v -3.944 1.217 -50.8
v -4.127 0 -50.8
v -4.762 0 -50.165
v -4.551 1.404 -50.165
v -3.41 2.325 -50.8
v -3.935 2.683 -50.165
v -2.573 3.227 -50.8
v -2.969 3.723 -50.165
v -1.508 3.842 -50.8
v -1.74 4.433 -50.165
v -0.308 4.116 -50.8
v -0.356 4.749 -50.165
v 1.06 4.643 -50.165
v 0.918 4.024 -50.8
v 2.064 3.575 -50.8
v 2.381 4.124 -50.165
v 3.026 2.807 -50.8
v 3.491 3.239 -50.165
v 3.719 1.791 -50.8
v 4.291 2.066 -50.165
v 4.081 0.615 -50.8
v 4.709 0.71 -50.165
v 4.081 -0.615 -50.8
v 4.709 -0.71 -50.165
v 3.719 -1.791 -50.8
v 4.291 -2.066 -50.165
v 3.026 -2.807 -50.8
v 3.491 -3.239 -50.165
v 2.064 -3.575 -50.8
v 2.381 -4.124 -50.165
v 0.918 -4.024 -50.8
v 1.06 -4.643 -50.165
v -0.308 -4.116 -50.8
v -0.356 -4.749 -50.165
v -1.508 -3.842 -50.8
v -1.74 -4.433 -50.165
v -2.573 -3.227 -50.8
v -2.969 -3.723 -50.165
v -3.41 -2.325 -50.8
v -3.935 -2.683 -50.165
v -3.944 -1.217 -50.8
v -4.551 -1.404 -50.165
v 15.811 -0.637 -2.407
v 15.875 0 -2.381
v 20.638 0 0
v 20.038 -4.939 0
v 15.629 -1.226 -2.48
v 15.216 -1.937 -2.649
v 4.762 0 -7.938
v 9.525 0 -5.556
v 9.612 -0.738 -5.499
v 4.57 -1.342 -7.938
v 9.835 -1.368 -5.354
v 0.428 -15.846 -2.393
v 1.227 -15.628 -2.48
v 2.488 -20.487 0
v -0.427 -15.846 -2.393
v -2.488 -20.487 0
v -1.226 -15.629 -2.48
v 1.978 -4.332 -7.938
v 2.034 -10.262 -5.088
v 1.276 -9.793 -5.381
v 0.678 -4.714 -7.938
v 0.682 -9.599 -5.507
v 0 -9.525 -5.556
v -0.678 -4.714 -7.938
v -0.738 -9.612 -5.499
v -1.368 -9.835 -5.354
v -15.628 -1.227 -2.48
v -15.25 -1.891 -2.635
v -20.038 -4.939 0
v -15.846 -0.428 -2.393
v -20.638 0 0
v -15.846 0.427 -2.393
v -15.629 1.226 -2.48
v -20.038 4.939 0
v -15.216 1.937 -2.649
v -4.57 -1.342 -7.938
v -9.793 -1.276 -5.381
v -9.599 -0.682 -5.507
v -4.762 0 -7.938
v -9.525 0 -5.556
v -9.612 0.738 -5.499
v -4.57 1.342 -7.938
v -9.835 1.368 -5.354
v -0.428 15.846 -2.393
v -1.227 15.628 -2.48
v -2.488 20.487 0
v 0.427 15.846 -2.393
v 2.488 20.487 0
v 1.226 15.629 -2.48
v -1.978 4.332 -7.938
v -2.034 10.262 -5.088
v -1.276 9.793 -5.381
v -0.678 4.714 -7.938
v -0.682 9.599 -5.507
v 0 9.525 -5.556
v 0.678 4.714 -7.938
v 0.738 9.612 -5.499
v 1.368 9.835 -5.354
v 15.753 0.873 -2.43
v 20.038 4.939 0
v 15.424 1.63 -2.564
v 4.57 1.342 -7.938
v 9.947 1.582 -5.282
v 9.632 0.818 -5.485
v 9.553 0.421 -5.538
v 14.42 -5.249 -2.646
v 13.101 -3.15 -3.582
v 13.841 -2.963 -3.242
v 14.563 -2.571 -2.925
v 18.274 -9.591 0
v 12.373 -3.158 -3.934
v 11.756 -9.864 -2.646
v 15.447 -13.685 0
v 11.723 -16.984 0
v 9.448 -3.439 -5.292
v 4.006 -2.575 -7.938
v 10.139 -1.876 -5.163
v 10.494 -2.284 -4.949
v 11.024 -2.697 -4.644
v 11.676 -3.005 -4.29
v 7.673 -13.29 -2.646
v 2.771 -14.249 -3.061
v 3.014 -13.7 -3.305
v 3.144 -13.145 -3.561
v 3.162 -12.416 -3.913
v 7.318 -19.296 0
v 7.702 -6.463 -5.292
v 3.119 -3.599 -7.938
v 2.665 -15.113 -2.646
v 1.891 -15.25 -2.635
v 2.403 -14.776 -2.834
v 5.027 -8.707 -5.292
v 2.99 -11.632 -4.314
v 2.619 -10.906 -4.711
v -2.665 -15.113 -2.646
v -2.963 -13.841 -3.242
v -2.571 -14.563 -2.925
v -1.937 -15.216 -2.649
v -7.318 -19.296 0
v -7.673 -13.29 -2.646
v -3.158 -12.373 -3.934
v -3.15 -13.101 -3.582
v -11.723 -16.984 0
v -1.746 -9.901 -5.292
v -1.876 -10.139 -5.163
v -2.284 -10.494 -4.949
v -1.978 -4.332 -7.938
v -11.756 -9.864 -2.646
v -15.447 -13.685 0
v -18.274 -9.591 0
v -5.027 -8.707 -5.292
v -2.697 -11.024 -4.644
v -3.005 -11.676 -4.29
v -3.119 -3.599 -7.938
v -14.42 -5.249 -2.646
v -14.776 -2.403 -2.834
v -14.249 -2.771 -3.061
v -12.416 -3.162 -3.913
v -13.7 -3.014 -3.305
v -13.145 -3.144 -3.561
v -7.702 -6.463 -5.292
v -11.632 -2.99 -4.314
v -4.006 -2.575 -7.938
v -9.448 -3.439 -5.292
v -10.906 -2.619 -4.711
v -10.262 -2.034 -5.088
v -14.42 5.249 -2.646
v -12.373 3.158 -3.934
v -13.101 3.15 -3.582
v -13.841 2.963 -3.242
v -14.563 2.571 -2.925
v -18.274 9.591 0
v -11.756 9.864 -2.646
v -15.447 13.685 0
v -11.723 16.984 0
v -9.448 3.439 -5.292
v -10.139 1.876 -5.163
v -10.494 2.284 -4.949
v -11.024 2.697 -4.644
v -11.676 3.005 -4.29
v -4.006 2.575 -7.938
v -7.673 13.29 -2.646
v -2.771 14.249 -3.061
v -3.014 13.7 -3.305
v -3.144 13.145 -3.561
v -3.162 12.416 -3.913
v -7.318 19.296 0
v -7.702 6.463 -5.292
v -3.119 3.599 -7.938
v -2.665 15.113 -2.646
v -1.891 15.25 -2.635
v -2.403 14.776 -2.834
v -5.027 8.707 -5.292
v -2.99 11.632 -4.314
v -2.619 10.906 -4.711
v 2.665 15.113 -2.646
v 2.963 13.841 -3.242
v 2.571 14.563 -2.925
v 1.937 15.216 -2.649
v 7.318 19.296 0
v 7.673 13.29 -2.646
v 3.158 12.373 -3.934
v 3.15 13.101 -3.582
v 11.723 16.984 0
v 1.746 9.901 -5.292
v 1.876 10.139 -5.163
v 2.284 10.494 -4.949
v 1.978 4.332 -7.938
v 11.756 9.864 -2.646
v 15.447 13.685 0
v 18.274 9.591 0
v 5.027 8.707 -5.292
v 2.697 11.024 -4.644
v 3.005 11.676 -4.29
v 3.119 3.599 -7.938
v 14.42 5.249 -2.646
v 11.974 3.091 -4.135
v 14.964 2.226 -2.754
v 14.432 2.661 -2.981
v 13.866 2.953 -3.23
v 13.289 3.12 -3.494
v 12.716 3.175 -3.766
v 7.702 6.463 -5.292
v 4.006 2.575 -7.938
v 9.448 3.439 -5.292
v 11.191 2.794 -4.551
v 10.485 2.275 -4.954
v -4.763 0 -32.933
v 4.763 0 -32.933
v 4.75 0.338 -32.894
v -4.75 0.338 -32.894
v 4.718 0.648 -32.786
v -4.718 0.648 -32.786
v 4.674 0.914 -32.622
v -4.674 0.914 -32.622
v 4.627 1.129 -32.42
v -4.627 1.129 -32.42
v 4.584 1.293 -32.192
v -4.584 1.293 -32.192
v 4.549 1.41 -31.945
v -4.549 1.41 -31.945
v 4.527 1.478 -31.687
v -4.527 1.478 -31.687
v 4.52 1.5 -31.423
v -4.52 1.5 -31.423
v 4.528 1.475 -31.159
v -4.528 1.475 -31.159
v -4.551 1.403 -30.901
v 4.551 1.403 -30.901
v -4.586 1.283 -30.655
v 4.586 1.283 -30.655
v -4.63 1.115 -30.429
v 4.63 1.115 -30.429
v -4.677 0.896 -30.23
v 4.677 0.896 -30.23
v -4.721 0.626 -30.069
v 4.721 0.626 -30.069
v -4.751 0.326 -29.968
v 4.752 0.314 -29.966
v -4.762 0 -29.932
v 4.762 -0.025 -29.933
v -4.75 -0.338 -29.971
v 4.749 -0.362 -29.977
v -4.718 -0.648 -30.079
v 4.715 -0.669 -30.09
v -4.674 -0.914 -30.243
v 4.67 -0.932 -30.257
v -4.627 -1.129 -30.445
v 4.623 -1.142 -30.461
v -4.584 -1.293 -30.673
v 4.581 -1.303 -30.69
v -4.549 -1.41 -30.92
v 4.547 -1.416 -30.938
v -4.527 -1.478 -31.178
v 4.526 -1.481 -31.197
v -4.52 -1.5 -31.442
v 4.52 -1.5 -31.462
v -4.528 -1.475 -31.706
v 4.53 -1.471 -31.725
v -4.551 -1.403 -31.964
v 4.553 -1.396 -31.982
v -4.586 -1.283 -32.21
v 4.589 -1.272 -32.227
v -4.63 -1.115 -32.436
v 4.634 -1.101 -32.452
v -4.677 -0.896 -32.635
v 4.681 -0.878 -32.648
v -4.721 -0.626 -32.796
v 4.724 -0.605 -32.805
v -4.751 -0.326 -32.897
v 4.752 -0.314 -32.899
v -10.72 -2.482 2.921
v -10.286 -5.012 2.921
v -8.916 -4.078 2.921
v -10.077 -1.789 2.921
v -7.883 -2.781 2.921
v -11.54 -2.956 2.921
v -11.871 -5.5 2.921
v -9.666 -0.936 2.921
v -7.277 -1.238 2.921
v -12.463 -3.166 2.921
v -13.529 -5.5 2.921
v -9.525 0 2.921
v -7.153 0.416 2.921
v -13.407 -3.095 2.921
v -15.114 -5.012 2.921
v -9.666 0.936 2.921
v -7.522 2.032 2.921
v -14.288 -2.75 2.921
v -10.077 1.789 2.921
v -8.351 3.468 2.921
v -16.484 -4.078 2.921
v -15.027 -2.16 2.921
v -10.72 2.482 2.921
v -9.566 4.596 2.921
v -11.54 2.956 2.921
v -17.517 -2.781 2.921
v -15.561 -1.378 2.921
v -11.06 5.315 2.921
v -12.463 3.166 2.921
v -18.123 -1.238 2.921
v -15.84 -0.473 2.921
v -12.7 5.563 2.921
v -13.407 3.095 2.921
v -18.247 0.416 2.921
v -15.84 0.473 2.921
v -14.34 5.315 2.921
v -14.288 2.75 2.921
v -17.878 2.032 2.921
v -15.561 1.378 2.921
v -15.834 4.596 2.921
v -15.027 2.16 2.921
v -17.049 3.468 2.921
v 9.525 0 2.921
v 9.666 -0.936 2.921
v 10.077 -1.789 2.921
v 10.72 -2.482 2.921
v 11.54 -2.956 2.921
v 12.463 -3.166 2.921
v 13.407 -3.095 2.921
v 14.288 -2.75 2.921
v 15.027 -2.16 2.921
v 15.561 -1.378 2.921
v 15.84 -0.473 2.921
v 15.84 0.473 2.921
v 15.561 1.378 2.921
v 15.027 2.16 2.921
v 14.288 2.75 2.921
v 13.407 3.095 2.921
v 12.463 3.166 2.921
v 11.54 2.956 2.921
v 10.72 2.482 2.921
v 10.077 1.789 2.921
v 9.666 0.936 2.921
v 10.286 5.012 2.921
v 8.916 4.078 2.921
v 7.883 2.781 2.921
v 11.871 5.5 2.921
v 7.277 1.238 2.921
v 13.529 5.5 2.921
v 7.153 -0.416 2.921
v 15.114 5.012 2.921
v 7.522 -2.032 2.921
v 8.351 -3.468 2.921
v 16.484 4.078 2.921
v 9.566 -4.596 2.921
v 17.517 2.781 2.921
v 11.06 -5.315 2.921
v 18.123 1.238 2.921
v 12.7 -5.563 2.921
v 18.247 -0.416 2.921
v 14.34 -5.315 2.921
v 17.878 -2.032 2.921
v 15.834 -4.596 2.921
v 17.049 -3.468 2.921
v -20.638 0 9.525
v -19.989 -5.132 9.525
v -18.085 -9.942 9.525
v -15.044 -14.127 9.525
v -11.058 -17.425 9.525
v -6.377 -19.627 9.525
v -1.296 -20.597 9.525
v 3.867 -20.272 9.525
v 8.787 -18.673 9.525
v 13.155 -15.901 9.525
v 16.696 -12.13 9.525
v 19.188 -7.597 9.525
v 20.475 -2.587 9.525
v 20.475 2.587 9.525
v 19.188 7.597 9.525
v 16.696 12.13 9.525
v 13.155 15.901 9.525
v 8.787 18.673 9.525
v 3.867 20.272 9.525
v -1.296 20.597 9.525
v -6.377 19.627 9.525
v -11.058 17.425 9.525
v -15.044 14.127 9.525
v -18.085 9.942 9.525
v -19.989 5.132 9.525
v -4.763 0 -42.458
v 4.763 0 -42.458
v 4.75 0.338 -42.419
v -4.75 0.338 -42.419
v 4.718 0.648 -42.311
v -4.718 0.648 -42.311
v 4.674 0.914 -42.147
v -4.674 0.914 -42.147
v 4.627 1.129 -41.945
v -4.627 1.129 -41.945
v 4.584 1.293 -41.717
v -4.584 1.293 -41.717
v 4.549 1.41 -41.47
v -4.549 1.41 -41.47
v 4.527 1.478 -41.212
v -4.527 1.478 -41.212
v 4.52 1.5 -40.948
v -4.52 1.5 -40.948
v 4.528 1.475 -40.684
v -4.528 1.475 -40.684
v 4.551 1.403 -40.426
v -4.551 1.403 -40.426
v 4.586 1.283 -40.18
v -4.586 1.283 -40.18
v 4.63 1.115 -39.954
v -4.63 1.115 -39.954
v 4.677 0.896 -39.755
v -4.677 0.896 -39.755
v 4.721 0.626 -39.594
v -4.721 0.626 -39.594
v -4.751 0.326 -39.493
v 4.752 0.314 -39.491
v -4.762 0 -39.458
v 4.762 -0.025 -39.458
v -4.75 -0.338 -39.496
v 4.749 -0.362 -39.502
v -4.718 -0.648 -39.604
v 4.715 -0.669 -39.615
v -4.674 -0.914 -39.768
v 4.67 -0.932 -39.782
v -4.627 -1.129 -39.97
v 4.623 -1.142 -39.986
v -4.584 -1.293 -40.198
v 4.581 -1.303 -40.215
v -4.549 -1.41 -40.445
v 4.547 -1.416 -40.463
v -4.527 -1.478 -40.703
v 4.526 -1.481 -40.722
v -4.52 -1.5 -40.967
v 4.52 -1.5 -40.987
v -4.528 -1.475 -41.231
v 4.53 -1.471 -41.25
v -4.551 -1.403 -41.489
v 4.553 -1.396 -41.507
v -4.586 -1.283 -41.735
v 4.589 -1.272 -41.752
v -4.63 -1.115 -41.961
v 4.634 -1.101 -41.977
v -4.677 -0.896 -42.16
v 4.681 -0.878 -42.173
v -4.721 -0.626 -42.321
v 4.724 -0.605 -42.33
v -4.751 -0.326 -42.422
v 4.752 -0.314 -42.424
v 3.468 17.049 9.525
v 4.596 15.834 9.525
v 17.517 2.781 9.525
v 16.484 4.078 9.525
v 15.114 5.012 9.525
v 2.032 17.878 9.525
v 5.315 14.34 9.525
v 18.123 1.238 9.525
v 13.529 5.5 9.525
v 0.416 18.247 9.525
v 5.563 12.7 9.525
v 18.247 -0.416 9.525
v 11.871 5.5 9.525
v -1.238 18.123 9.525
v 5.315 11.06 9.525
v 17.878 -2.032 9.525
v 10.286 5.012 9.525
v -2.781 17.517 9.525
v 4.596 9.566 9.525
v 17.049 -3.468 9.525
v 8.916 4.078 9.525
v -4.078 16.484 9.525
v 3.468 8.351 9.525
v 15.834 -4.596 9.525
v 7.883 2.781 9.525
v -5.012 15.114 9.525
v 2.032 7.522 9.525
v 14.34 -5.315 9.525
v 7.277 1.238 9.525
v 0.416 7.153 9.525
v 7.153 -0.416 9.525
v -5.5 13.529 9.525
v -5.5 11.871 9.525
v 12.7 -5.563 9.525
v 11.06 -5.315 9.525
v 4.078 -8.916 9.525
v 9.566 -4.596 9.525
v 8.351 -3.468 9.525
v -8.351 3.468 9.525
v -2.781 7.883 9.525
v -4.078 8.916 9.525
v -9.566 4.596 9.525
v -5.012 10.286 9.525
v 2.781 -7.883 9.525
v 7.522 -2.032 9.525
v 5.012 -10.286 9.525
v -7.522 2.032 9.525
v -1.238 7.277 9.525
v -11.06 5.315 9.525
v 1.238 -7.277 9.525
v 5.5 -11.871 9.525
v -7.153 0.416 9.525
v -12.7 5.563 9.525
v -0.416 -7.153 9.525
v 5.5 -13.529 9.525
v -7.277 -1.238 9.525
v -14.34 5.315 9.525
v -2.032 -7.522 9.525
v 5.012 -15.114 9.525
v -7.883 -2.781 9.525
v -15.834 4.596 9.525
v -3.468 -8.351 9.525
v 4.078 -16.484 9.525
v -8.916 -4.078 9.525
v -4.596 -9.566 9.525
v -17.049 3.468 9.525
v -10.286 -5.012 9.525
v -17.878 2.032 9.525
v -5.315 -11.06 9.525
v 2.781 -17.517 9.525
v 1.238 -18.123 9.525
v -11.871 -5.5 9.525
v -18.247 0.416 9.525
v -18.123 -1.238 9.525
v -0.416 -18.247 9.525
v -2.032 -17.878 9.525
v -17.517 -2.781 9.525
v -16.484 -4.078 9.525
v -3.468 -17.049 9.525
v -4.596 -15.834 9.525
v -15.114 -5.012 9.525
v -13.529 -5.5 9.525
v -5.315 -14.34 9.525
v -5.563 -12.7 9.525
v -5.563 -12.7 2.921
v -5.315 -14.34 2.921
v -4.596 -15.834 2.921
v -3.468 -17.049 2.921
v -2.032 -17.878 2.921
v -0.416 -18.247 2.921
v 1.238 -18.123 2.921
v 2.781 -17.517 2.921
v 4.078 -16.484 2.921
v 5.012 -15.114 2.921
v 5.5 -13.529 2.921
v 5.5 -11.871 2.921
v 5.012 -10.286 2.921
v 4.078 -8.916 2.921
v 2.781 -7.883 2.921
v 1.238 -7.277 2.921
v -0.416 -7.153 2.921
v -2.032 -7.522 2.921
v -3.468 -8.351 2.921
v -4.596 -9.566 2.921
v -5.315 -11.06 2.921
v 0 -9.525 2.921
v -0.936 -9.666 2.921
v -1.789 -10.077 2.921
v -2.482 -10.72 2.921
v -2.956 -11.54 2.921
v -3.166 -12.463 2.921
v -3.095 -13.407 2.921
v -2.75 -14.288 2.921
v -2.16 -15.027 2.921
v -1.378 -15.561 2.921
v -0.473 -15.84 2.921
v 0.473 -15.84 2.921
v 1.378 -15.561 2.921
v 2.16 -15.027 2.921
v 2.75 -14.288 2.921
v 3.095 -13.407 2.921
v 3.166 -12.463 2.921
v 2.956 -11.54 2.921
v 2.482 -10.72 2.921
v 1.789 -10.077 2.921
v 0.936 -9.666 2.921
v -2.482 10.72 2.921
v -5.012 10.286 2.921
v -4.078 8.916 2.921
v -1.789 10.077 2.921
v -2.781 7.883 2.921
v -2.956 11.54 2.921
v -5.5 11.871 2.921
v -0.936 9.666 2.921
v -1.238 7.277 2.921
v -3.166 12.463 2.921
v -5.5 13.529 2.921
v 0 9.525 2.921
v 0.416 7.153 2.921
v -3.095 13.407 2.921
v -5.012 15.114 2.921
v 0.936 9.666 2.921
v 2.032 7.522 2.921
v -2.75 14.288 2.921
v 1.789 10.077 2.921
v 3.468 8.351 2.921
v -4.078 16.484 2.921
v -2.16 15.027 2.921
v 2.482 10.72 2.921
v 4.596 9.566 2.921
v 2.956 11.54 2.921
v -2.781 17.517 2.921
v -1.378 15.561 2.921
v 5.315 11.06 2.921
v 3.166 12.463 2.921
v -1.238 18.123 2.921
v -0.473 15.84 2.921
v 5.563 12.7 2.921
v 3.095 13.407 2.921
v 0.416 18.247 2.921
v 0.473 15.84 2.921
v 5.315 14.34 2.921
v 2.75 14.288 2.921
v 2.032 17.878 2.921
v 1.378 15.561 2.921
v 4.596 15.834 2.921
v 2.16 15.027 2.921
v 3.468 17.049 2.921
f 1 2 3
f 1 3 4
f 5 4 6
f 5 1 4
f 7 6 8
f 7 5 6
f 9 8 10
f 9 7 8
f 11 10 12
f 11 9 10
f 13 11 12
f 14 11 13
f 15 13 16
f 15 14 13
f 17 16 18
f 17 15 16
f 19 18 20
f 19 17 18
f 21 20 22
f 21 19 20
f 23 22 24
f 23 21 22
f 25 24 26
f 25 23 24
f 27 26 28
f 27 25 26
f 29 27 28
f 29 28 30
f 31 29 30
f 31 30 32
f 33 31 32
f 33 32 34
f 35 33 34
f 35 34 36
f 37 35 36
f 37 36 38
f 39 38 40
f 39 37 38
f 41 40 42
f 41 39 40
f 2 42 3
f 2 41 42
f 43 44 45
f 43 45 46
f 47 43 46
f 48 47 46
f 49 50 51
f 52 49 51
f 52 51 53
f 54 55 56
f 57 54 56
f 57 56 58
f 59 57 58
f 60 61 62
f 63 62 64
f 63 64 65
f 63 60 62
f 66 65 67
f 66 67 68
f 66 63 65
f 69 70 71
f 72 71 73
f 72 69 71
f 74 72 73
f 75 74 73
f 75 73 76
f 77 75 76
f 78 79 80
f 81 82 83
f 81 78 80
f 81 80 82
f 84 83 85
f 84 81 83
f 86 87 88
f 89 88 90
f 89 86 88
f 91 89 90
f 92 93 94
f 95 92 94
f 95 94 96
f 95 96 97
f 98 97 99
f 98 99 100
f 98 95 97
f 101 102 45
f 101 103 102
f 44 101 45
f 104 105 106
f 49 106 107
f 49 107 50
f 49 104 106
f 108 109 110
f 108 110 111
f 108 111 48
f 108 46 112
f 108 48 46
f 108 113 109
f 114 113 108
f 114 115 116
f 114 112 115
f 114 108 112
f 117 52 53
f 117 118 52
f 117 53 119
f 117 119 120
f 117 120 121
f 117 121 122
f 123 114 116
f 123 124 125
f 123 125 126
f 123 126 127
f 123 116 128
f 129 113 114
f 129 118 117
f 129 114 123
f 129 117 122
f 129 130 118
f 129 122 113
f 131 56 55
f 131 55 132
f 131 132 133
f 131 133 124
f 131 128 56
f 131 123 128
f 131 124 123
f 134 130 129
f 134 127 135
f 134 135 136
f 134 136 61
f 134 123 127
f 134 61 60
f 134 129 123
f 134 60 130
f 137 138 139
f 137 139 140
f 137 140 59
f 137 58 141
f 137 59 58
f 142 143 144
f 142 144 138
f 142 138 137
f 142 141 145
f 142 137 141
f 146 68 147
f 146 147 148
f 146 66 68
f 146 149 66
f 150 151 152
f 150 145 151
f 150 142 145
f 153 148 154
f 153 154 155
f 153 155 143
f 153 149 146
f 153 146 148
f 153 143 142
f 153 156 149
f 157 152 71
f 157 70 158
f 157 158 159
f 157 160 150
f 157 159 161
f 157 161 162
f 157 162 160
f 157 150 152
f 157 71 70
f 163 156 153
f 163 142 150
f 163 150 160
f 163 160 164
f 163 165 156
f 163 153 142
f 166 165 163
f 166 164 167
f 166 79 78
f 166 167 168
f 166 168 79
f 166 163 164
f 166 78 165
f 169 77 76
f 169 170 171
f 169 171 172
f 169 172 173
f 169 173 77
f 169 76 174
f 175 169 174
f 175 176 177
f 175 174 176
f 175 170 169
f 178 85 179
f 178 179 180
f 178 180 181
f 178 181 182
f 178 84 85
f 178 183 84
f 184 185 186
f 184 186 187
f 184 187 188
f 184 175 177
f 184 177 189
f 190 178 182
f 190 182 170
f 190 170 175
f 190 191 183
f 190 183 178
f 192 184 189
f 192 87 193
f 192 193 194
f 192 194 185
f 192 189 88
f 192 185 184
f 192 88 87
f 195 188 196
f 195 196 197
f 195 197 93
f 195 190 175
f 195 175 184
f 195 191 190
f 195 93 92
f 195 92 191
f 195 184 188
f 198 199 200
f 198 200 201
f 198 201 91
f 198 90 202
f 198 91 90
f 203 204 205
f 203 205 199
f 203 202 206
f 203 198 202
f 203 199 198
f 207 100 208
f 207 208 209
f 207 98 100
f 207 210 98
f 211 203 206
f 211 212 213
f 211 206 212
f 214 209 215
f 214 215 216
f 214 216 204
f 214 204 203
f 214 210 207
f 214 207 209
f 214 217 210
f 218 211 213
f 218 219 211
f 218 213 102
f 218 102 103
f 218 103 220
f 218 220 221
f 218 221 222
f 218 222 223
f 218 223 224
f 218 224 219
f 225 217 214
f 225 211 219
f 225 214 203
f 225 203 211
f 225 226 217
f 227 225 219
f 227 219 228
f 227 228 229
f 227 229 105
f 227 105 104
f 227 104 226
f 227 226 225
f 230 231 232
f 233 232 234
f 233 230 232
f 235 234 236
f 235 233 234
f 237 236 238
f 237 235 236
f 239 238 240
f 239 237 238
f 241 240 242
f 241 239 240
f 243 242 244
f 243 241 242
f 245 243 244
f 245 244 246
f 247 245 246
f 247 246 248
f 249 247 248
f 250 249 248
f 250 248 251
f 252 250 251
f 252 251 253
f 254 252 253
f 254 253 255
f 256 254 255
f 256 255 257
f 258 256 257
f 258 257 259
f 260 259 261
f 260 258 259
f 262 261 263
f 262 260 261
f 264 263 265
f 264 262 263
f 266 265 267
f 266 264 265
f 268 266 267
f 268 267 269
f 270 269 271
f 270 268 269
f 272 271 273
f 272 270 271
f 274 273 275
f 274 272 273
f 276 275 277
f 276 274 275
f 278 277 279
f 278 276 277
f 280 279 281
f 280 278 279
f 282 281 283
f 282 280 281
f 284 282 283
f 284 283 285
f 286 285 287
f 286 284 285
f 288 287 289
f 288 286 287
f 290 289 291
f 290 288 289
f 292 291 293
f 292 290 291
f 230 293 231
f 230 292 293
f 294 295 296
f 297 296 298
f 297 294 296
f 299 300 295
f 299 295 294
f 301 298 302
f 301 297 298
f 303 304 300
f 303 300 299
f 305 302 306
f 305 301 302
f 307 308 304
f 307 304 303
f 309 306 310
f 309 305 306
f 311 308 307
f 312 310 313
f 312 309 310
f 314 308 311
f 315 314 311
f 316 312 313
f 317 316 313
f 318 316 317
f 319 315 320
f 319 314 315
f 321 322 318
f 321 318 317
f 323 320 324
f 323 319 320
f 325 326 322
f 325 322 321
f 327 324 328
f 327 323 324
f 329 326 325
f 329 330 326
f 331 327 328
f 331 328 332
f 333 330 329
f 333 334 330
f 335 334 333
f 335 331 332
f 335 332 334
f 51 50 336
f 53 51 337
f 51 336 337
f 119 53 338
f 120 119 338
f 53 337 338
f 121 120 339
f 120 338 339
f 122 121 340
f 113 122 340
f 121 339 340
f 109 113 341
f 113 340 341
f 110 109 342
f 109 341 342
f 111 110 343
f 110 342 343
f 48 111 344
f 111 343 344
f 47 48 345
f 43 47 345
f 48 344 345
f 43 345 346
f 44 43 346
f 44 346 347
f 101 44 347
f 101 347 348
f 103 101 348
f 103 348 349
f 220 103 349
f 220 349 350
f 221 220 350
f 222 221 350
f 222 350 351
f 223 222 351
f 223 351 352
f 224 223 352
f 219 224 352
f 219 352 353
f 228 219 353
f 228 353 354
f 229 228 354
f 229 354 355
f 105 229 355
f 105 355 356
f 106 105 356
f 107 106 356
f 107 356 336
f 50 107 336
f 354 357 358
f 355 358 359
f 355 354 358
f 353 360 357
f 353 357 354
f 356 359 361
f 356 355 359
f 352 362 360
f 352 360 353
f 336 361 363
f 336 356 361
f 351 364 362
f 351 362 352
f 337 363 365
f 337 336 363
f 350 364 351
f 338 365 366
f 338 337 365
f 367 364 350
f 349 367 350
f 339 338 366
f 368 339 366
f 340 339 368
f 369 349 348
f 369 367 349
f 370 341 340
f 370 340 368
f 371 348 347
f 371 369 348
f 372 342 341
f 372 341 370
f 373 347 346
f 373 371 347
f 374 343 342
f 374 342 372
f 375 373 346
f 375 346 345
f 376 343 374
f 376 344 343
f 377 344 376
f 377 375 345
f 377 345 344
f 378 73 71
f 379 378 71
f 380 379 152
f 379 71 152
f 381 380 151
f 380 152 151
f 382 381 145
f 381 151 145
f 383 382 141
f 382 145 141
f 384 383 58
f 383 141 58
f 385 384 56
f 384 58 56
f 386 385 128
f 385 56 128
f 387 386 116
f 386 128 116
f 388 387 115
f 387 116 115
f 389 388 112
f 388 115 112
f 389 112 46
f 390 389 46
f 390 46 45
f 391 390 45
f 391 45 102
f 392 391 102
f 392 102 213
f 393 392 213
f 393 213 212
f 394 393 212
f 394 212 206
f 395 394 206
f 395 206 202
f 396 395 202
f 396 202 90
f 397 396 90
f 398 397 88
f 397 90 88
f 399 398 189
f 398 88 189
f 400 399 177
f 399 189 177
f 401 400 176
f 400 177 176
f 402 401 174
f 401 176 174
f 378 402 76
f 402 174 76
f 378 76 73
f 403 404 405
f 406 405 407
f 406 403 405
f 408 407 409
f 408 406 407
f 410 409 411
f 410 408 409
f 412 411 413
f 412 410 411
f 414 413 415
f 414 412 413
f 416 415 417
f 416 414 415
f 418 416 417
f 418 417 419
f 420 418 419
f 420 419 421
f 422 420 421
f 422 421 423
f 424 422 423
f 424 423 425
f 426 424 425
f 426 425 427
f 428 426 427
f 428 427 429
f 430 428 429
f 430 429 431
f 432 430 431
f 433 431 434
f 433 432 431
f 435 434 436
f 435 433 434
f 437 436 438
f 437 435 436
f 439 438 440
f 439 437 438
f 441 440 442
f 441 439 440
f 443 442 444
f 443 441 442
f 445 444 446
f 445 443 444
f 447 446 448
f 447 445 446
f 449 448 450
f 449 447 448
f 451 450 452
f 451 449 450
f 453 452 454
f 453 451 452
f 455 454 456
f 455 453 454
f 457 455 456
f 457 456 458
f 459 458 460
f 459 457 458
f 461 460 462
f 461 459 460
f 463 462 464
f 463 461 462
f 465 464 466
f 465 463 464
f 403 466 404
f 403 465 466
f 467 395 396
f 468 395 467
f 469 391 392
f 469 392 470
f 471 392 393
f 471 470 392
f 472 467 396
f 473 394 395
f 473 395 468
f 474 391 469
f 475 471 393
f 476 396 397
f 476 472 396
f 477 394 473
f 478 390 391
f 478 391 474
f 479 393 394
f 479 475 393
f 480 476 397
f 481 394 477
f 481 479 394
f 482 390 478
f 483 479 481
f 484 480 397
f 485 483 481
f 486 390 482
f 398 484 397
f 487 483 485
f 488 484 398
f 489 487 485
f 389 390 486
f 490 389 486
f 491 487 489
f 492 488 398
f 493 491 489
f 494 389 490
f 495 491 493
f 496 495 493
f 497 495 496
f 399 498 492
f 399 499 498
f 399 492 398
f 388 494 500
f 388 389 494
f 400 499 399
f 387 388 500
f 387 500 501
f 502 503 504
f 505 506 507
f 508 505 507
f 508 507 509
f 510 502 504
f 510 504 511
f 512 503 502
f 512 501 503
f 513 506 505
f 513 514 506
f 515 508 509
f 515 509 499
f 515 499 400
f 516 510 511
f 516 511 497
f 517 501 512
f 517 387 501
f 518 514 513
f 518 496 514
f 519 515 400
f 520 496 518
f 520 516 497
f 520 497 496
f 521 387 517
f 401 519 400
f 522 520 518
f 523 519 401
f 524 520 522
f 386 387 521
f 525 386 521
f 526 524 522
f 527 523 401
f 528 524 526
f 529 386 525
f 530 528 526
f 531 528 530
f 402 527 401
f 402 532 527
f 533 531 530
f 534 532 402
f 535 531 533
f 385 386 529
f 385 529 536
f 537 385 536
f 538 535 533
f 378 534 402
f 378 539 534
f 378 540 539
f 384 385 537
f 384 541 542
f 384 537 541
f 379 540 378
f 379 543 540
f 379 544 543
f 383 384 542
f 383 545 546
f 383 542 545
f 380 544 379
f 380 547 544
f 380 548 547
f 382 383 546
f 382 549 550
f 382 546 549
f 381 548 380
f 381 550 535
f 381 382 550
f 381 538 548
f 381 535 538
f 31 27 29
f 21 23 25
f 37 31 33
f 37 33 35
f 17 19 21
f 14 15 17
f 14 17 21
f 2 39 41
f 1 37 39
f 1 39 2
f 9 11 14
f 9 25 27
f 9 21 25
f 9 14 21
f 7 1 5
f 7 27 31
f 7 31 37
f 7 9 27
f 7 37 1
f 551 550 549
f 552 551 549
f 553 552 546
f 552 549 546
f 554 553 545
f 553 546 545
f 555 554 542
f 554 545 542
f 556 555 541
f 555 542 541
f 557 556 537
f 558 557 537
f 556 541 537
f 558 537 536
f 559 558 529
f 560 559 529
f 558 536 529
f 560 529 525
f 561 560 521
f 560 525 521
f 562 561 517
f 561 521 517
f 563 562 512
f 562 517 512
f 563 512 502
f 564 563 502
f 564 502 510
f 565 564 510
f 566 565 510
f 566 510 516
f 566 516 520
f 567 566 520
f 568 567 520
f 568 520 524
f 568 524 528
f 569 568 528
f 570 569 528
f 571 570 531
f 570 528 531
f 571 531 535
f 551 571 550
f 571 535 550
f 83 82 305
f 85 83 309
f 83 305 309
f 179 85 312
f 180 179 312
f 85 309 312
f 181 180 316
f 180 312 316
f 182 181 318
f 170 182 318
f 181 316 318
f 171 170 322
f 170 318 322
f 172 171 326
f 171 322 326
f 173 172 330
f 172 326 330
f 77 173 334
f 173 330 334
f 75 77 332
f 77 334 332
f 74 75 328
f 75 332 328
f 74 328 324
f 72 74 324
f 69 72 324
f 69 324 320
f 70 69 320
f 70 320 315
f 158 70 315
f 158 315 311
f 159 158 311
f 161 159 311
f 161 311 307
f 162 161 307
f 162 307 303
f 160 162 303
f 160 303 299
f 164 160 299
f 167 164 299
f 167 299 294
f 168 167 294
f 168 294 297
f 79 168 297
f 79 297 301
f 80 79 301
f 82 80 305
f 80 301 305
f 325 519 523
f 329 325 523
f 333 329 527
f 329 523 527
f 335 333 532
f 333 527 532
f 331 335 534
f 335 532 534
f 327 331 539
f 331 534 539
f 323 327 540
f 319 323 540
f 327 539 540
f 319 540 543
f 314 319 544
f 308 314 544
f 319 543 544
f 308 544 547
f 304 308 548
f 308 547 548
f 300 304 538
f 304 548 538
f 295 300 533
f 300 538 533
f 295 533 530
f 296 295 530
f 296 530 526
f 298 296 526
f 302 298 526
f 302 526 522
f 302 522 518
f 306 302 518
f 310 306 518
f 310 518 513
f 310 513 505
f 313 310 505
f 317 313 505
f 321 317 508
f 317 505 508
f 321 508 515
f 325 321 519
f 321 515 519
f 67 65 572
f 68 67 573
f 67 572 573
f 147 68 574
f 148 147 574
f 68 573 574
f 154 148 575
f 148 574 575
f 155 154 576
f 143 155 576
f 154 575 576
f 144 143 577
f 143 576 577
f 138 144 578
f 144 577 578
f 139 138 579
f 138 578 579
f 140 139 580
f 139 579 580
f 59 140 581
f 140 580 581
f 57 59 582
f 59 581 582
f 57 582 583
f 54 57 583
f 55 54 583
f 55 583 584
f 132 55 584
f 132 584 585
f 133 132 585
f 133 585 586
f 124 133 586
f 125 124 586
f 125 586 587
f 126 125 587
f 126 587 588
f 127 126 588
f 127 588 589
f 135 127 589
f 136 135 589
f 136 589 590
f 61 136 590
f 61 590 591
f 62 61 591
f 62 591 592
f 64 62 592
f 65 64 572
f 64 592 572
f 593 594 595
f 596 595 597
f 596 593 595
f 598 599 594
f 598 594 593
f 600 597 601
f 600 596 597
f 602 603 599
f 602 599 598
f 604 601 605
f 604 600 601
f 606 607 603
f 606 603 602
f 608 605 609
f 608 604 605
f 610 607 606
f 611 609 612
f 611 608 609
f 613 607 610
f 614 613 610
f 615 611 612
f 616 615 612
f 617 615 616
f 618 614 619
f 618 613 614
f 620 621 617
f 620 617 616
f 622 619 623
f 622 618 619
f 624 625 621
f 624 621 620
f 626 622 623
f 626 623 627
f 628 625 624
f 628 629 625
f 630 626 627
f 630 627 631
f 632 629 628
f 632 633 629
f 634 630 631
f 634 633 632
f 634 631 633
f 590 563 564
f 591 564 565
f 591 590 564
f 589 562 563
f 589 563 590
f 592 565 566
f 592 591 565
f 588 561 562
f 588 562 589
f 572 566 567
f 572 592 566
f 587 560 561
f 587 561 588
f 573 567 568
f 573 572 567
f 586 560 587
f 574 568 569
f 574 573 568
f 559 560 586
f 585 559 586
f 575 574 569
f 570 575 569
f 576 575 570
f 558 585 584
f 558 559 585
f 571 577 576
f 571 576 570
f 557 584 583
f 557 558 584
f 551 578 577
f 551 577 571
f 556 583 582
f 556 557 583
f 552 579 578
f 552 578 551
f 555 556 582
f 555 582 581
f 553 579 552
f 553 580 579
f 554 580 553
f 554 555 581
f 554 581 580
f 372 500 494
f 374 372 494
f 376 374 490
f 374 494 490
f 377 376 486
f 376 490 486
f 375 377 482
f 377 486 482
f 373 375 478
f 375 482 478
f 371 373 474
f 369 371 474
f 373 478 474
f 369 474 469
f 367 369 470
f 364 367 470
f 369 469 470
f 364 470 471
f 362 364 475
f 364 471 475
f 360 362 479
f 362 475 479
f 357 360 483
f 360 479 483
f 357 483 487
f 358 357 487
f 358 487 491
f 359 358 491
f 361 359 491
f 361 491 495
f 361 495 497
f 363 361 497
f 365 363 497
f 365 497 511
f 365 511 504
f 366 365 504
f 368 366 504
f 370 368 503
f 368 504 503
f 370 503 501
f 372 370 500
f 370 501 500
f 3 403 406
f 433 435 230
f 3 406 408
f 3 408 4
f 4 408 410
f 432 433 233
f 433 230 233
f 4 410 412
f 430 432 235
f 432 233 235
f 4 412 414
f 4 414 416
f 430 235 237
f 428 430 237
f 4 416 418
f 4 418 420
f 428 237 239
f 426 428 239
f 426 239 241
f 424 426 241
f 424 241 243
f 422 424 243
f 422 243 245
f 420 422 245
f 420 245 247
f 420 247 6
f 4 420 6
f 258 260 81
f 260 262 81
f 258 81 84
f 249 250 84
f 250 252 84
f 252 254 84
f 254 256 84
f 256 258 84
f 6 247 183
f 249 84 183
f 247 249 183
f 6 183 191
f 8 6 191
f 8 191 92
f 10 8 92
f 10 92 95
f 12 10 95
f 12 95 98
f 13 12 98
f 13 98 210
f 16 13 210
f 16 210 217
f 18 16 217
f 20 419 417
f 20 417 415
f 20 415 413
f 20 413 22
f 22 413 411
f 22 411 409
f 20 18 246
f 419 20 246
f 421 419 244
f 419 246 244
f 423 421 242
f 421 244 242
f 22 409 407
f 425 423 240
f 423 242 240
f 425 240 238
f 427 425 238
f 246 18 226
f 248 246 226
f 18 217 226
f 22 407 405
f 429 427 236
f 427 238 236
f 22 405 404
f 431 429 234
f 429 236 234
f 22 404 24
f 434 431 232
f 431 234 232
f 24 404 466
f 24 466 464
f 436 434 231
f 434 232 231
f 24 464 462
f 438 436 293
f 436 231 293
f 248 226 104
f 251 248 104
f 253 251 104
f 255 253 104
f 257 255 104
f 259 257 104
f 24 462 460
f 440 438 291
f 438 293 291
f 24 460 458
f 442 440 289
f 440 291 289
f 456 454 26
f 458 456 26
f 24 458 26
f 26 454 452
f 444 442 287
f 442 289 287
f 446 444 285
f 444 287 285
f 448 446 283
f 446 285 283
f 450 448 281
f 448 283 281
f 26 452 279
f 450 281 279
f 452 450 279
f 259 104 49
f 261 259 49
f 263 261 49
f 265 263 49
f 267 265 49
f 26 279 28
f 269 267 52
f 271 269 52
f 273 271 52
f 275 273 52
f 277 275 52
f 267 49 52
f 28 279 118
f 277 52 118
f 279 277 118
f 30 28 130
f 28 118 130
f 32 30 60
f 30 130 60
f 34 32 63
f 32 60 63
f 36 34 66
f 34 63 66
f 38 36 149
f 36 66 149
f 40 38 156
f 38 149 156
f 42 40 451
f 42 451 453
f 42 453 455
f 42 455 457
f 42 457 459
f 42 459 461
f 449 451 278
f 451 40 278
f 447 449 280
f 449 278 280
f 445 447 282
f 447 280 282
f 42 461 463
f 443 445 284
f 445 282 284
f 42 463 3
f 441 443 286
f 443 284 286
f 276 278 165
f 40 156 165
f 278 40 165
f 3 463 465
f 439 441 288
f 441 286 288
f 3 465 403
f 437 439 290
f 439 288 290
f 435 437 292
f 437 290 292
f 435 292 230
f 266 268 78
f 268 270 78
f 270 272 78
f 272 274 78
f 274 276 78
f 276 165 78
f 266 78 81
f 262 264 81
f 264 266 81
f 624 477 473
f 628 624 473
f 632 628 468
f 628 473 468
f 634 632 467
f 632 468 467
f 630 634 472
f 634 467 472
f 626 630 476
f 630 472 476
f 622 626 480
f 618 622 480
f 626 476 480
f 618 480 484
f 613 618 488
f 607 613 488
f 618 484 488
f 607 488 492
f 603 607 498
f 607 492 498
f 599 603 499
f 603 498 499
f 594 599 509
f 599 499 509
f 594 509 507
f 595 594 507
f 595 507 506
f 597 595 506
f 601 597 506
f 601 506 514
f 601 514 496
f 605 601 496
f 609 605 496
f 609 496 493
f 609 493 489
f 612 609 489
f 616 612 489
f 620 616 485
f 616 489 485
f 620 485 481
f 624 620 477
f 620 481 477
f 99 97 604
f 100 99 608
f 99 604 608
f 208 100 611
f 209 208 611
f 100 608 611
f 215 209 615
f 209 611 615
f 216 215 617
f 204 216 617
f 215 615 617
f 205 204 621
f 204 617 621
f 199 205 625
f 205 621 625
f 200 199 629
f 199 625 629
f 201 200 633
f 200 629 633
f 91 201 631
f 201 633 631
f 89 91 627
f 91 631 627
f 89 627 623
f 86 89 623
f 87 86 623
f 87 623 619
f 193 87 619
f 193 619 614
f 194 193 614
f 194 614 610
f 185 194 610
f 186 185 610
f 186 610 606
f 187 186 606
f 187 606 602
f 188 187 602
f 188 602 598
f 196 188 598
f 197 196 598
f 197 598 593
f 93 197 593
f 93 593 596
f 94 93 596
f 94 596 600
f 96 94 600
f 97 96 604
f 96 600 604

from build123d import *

# Parameters (mm, degrees)
SKETCH1_R               = 20.6375
BOSS_EXTRUDE1_DEPTH     = 9.525
SKETCH3_R               = 5.5626
CUT_EXTRUDE1_DEPTH      = 6.604
CIRPATTERN1_COUNT       = 4
SKETCH10_R              = 4.7625
BOSS_EXTRUDE3_DEPTH     = 50.8
CUT_EXTRUDE3_DEPTH      = 59.587138627
CUT_EXTRUDE3_DEPTH_BACK = 59.587138627
SKETCH11_R              = 1.5
SKETCH13_R              = 3.175
CUT_EXTRUDE4_DEPTH      = 62.13721178
CIRPATTERN2_COUNT       = 4
CHAMFER1_SIZE           = 0.635


with BuildPart() as part:
    # Sketch1 → Boss-Extrude1 (new body)
    with BuildSketch(Plane.XY):
        with Locations(Location((0, 0, 0), (0, 0, 180))):
            Circle(SKETCH1_R)
    extrude(amount=BOSS_EXTRUDE1_DEPTH)

    # Sketch3 → Cut-Extrude1 (cut)
    with BuildSketch(Plane.XY.offset(9.525)):
        with Locations((0, 12.7)):
            Circle(SKETCH3_R)
    cut_extrude1 = extrude(amount=-CUT_EXTRUDE1_DEPTH, mode=Mode.SUBTRACT)

    # CirPattern1: Cut-Extrude1 ×4 about axis
    cirpattern1_axis = Axis((0, 0, 0), (0, 0, 1))
    for i in range(1, CIRPATTERN1_COUNT):
        add(cut_extrude1.rotate(cirpattern1_axis, i * 360 / CIRPATTERN1_COUNT), mode=Mode.SUBTRACT)

    # Sketch10 → Boss-Extrude3 (add)
    with BuildSketch(Plane(origin=(0, 0, 0), x_dir=(-1, 0, 0), z_dir=(0, 0, -1))):
        Circle(SKETCH10_R)
    extrude(amount=BOSS_EXTRUDE3_DEPTH)

    # Sketch11 → Cut-Extrude3 (cut, two sides: drawn at the far end of the back side and taken through both)
    with BuildSketch(Plane(origin=(0, 0, 0), x_dir=(0, 0, -1), z_dir=(1, 0, 0)).offset(-CUT_EXTRUDE3_DEPTH_BACK)):
        with Locations((31.4325, 0)):
            Circle(SKETCH11_R)
        with Locations((40.9575, 0)):
            Circle(SKETCH11_R)
    extrude(amount=CUT_EXTRUDE3_DEPTH + CUT_EXTRUDE3_DEPTH_BACK, mode=Mode.SUBTRACT)

    # Sketch12 → Revolve1 (revolve)
    with BuildSketch(Plane(origin=(0, 0, 0), x_dir=(1, 0, 0), z_dir=(0, 1, 0)), mode=Mode.PRIVATE) as revolve1_sk:
        Polygon((-20.6375, 0), (-4.7625, 7.9375), (-4.7625, 0), align=None)
    revolve(revolve1_sk.sketch.rotate(Axis((0, 0, 0), (0, 0, -1)), 180), axis=Axis((0, 0, 0), (0, 0, -1)))

    # Sketch13 → Cut-Extrude4 (cut, through all)
    with BuildSketch(Plane.XY.offset(2.921)):
        with Locations((-12.7, 0)):
            Circle(SKETCH13_R)
    cut_extrude4 = extrude(amount=-CUT_EXTRUDE4_DEPTH, mode=Mode.SUBTRACT)

    # CirPattern2: Cut-Extrude4 ×4 about axis
    cirpattern2_axis = Axis((0, 0, 0), (0, 0, 1))
    for i in range(1, CIRPATTERN2_COUNT):
        add(cut_extrude4.rotate(cirpattern2_axis, i * 360 / CIRPATTERN2_COUNT), mode=Mode.SUBTRACT)

    # Chamfer1
    chamfer1_edges = [part.edges().sort_by_distance(p)[0] for p in [
        (4.7625, 0, -50.8),
    ]]
    chamfer(chamfer1_edges, length=CHAMFER1_SIZE)


solid = part.part
